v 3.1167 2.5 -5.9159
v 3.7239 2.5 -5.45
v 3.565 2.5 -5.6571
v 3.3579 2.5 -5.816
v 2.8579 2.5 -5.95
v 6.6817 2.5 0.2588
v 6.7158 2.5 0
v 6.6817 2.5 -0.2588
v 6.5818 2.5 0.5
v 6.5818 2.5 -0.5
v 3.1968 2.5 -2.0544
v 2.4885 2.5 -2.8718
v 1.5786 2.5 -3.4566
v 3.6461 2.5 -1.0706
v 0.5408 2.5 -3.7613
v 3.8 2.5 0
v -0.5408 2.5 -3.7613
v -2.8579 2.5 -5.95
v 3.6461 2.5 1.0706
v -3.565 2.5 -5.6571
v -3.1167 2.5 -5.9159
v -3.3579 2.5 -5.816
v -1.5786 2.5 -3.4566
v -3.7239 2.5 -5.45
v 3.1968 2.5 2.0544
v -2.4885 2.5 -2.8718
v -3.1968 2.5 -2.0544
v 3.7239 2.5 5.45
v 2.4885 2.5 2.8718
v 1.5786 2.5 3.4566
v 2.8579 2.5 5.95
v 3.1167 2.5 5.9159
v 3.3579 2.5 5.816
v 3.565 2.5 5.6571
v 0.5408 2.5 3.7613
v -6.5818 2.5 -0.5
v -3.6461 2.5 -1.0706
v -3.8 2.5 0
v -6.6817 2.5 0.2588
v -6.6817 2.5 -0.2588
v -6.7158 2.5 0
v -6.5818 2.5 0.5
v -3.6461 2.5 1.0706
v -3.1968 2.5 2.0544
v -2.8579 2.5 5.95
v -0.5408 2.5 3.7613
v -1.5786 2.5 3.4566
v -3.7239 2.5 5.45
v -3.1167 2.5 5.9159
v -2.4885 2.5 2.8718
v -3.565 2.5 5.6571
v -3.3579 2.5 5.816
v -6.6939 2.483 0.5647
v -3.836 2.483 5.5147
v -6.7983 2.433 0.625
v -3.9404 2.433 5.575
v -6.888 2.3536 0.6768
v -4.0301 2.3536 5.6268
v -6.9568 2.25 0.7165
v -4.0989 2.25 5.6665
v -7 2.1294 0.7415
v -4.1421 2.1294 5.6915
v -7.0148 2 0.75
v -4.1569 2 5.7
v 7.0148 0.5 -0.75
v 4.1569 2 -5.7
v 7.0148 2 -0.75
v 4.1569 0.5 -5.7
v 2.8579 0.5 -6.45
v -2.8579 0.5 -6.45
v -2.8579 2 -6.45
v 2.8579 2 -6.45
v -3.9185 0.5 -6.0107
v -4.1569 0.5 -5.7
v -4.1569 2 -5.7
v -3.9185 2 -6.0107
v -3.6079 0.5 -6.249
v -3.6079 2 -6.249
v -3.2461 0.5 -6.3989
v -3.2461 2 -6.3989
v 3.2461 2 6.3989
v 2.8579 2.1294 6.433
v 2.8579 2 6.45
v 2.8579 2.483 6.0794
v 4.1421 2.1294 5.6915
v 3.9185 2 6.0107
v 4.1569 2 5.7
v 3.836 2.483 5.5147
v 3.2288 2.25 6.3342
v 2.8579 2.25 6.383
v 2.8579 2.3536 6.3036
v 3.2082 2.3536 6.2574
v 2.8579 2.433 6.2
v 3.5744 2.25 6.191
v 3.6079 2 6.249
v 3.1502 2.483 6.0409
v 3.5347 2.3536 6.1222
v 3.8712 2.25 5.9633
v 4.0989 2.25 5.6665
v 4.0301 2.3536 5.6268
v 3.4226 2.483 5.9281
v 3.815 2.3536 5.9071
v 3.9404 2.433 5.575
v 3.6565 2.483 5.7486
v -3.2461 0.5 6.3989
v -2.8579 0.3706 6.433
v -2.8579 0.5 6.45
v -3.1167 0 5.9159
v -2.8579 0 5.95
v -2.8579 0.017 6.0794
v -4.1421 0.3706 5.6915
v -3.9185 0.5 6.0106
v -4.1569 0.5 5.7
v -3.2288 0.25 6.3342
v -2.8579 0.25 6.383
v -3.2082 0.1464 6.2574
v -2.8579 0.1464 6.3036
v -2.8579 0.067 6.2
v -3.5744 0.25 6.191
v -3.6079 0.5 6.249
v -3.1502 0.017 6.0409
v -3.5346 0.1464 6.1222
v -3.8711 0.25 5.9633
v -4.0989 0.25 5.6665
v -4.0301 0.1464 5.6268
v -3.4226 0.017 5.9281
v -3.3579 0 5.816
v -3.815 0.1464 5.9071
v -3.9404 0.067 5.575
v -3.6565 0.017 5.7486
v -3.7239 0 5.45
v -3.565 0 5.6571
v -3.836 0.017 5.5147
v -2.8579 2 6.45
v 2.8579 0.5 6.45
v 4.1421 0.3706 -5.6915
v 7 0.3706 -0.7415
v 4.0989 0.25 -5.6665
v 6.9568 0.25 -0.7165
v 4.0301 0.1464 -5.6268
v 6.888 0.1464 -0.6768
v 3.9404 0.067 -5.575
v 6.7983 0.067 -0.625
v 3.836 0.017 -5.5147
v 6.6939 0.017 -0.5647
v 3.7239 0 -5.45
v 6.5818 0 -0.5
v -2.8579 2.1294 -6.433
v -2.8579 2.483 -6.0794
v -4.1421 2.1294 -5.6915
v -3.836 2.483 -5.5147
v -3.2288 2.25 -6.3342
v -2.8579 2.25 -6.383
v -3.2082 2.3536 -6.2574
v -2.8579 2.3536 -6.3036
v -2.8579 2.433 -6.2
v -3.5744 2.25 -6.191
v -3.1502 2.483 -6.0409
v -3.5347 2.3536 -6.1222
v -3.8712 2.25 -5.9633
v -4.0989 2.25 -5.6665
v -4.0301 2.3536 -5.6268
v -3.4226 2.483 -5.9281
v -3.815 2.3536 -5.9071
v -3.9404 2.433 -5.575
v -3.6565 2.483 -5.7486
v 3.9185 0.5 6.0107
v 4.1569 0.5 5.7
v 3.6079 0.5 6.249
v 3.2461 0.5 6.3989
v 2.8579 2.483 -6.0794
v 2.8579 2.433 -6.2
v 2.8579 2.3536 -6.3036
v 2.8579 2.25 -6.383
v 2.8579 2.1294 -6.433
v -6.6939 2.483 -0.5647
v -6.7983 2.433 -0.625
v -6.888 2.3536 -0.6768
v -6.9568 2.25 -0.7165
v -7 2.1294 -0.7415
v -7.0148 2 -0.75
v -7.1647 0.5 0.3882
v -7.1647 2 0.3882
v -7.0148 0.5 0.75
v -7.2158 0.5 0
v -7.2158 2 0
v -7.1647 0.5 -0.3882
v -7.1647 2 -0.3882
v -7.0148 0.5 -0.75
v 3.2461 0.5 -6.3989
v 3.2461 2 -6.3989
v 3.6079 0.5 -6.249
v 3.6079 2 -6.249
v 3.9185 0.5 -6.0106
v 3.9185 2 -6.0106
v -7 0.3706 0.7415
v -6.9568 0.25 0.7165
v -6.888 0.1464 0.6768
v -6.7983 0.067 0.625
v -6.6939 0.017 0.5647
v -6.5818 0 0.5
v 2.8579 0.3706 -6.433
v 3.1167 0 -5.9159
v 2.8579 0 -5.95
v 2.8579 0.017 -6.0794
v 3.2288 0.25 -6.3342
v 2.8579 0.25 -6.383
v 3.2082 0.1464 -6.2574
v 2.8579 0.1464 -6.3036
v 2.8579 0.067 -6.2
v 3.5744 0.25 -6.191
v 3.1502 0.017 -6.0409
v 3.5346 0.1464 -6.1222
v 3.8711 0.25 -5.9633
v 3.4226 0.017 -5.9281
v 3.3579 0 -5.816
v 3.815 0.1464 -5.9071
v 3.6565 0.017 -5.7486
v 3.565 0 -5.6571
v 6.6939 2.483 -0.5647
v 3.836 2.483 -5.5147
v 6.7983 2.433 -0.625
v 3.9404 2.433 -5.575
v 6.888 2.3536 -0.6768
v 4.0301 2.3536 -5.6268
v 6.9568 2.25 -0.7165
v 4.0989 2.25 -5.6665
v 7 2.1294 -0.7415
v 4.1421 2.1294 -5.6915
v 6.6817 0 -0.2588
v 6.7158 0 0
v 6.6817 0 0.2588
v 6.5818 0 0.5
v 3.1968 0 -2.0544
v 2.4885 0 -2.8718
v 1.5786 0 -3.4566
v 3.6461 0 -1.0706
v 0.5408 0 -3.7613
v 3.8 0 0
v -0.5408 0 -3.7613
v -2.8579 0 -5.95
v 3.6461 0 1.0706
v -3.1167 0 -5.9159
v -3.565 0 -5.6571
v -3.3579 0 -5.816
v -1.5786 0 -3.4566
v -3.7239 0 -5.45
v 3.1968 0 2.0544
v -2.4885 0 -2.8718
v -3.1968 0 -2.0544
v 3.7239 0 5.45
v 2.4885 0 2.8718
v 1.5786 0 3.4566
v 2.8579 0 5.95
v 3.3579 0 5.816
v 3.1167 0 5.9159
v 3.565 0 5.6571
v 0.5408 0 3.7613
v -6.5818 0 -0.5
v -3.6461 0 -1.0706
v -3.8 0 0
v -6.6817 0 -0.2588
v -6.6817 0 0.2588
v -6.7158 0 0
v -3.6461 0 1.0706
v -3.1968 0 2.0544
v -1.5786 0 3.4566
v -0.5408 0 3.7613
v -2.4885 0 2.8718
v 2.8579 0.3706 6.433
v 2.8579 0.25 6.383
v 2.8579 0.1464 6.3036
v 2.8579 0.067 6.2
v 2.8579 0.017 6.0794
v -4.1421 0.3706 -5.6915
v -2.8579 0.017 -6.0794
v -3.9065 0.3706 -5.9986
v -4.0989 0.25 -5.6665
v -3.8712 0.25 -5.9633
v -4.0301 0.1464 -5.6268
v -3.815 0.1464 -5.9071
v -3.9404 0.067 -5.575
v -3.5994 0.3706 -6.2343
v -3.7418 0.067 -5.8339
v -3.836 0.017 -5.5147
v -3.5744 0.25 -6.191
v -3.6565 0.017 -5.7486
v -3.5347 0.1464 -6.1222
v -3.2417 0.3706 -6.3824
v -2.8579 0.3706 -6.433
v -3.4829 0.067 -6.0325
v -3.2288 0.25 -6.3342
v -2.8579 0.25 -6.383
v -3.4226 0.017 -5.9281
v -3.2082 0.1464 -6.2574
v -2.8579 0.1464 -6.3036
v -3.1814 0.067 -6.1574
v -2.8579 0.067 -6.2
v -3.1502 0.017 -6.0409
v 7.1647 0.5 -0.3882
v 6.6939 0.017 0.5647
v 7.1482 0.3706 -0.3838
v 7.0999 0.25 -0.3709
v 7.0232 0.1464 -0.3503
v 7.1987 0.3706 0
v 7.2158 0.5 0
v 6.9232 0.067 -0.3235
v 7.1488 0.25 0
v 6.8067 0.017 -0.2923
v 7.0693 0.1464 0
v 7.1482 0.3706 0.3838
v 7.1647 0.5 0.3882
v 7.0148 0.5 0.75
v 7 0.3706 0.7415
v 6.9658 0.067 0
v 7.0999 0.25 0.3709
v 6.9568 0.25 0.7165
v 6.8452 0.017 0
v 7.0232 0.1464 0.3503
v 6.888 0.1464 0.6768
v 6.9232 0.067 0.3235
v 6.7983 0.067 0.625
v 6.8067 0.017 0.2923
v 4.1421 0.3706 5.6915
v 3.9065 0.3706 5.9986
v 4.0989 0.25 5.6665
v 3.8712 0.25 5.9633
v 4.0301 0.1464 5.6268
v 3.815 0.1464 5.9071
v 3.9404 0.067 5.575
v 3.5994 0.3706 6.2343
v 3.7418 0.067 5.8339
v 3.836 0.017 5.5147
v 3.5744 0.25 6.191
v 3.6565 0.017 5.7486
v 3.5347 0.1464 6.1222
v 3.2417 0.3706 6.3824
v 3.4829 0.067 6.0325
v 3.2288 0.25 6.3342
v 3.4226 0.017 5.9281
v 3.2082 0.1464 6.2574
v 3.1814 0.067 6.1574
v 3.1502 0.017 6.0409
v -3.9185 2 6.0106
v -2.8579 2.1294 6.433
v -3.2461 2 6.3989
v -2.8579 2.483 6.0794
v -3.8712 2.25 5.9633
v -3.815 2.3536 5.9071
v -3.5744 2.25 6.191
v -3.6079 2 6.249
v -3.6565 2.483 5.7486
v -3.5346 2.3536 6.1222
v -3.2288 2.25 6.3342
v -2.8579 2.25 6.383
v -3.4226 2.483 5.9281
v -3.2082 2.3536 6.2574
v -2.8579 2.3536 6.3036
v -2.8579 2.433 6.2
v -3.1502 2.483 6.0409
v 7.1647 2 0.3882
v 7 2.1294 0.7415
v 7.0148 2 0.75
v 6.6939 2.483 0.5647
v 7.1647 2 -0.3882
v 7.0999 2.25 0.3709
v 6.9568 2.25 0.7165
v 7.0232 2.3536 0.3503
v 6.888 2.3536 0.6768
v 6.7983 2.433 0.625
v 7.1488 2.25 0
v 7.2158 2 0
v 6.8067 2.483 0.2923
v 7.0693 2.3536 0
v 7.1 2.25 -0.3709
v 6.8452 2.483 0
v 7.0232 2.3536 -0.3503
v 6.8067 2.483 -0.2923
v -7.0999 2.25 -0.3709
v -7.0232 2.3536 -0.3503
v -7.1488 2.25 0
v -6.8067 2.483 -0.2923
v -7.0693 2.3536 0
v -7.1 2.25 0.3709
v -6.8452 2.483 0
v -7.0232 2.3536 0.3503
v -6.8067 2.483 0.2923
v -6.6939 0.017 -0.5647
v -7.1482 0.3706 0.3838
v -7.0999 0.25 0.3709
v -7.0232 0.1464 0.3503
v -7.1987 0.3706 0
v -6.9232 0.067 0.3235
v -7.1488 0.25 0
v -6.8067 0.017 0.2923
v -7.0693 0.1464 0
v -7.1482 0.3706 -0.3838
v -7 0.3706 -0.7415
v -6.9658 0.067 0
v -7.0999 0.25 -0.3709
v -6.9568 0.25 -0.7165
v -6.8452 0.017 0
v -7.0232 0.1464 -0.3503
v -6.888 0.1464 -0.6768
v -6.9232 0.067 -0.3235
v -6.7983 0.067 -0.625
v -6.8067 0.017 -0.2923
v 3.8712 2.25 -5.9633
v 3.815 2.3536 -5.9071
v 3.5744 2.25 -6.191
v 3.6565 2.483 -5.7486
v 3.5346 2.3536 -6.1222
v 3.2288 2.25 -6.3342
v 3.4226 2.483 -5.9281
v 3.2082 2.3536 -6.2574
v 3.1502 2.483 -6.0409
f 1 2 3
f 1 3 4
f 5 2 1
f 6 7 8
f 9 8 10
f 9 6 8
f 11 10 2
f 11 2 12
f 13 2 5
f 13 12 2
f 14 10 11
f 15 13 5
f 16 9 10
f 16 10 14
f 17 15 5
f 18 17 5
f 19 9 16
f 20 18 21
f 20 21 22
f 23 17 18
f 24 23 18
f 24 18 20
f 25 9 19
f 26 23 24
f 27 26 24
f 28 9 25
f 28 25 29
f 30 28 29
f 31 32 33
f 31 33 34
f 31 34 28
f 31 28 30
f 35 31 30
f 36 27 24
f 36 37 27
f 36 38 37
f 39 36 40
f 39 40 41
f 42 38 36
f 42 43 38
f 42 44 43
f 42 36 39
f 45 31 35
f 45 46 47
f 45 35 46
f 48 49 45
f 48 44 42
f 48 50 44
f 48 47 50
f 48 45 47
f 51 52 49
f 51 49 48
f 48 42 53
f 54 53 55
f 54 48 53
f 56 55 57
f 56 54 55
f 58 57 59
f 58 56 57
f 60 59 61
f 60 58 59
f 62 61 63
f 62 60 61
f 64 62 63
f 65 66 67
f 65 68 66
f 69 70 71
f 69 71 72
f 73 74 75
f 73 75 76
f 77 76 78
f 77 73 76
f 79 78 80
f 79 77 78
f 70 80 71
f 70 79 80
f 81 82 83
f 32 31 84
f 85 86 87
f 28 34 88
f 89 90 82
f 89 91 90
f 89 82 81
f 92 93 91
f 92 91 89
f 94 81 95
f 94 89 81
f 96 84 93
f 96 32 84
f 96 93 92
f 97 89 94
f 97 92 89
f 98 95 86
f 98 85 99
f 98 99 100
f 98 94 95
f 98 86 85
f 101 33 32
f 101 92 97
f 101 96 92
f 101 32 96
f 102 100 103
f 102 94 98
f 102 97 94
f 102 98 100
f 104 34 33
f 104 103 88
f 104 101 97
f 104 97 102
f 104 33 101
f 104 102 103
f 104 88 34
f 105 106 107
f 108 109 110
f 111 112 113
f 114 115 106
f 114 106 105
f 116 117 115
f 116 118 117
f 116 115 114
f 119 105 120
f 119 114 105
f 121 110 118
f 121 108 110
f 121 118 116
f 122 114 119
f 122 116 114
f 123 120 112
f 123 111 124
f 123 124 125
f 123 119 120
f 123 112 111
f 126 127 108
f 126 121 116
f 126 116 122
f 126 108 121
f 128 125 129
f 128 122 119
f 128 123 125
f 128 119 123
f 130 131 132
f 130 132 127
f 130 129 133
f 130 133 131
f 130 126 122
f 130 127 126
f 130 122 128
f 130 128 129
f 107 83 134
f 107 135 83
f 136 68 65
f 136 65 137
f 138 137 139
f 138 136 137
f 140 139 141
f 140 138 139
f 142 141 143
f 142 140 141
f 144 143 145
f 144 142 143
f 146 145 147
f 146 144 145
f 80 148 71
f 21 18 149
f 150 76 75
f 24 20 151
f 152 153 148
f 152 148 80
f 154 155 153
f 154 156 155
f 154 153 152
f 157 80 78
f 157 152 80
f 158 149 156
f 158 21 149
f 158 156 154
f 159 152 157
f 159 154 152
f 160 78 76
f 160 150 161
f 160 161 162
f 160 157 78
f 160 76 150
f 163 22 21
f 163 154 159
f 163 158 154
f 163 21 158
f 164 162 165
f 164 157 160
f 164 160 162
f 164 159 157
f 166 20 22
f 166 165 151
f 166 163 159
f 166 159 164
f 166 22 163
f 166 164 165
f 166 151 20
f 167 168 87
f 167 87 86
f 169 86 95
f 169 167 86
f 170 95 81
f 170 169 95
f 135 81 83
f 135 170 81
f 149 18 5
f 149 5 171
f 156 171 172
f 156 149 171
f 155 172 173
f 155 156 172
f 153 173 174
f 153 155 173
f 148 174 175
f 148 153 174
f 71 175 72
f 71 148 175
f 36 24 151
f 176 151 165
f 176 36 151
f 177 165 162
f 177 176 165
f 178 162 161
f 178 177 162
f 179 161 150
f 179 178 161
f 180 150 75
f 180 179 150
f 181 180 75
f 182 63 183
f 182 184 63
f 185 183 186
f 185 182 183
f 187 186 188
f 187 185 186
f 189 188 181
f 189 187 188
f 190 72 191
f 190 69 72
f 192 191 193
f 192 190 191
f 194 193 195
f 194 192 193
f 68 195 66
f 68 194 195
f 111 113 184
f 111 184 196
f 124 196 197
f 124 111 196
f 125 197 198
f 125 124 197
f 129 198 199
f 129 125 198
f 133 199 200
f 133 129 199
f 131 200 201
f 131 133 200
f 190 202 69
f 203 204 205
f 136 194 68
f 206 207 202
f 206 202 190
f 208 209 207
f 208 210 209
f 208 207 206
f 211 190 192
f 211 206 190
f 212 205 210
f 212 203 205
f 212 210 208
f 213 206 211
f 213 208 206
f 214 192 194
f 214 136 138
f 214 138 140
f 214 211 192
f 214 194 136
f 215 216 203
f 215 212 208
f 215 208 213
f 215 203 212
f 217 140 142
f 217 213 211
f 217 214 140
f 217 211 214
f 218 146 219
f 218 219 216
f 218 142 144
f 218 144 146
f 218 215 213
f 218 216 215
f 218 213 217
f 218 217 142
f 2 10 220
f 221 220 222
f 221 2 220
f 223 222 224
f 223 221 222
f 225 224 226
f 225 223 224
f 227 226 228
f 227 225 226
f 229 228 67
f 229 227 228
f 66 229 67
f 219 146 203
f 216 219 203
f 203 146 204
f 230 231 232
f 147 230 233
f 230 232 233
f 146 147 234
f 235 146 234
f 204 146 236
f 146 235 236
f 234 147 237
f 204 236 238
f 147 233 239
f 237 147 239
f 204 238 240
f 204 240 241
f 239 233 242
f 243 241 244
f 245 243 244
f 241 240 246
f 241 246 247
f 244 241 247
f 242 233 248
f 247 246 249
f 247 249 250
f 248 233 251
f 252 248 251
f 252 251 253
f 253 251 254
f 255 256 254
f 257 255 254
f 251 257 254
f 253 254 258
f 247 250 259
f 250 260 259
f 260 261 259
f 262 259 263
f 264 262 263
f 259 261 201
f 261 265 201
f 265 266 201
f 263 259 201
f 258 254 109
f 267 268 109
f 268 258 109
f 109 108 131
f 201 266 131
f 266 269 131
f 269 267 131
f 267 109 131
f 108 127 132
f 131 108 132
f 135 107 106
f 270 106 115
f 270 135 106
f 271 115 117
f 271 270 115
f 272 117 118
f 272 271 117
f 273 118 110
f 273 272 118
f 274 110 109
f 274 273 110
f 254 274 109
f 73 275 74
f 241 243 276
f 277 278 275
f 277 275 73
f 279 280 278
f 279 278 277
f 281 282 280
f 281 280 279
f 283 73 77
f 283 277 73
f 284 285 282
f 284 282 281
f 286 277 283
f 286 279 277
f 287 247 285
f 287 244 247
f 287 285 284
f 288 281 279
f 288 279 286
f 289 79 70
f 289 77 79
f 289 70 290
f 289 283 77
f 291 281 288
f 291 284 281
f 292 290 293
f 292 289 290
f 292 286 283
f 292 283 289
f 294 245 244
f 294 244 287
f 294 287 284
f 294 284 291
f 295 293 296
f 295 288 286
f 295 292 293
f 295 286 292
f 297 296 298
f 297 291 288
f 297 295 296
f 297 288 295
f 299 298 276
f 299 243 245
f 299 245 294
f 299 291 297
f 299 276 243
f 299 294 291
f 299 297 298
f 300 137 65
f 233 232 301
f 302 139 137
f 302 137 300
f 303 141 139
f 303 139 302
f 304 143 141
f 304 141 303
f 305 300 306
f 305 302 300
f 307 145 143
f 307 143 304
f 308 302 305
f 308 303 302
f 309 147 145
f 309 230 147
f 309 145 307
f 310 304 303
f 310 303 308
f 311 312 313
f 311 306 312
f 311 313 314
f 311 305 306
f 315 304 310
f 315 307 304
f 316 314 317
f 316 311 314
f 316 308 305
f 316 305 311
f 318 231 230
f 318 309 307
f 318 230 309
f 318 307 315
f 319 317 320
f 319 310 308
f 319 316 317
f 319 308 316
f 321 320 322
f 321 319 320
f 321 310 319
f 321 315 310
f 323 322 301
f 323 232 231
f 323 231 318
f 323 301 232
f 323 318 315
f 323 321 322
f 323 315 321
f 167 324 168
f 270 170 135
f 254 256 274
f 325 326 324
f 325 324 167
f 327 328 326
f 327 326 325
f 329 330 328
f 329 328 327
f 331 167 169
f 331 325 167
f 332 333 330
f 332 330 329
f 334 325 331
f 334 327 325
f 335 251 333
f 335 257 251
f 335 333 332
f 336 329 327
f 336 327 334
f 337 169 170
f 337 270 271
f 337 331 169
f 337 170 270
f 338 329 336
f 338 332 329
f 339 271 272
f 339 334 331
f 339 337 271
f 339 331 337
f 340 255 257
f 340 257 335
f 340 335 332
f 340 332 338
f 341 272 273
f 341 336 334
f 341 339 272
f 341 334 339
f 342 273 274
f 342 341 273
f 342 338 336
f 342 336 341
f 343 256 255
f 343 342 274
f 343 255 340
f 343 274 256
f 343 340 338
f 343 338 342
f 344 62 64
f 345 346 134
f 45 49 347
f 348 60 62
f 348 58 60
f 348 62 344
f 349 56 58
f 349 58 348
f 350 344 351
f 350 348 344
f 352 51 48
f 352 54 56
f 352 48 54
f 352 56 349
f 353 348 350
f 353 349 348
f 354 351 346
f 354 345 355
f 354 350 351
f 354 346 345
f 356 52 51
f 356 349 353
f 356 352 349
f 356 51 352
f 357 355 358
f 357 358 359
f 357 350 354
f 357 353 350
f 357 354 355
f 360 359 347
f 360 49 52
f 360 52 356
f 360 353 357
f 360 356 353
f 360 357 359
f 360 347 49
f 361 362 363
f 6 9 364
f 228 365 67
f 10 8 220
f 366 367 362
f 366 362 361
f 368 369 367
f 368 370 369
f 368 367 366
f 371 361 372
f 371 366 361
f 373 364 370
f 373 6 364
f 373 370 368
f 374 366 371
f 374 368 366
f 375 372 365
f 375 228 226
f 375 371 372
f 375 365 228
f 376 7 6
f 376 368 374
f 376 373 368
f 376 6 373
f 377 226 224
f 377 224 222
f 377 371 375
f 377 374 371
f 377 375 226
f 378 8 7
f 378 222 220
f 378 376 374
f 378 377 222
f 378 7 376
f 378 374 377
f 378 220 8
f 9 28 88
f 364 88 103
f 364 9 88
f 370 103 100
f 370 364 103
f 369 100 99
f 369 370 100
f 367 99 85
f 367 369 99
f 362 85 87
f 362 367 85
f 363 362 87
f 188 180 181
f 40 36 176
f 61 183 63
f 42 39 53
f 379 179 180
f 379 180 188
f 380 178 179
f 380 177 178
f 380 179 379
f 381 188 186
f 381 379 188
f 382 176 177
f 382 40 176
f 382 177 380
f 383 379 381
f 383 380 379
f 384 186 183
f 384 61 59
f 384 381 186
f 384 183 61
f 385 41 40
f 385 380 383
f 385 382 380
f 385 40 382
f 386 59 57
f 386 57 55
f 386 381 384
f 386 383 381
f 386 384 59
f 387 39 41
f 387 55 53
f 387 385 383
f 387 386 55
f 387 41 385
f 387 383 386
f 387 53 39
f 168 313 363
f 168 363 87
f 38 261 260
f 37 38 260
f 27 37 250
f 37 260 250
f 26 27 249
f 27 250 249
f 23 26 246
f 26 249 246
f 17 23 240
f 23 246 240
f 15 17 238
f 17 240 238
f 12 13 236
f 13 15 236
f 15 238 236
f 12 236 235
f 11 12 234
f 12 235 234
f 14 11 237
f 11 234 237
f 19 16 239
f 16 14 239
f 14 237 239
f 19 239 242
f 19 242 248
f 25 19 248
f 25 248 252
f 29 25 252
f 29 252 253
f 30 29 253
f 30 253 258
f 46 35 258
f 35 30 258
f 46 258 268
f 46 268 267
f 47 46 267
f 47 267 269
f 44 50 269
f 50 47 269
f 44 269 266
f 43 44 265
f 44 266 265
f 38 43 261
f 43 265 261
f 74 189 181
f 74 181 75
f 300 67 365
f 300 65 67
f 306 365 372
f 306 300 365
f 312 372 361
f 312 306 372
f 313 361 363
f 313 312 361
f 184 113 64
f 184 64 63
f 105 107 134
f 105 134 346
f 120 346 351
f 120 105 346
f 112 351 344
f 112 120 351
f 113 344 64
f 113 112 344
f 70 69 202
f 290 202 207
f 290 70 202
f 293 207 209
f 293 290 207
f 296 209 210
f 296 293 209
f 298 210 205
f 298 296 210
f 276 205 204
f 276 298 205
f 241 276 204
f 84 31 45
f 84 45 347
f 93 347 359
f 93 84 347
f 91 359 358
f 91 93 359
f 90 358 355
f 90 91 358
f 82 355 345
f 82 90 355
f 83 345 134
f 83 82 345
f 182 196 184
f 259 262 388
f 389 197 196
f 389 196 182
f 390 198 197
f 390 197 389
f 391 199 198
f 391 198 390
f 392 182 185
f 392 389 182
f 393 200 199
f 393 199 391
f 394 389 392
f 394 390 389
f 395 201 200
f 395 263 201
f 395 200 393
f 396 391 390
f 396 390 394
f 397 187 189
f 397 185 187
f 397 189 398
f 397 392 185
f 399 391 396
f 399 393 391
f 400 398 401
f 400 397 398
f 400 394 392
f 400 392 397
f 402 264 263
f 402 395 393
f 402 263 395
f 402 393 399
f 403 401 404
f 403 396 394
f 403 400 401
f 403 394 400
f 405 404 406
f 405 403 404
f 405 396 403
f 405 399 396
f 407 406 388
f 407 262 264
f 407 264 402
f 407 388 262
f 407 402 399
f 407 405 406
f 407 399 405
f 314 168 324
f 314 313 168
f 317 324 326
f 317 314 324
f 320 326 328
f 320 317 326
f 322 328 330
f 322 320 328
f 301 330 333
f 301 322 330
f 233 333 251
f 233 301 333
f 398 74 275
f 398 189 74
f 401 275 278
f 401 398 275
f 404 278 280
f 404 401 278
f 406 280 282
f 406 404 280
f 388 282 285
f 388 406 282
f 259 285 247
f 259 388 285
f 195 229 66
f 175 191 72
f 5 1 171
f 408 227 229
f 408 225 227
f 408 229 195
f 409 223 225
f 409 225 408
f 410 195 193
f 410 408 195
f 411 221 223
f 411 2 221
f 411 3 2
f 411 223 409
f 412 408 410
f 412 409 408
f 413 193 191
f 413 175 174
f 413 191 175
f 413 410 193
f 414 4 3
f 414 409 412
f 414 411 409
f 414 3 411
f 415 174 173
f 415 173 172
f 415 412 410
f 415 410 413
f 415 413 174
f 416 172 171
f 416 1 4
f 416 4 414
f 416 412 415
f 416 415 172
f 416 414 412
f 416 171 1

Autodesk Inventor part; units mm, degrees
ref_plane "YZ Plane" through (0, 0, 0) normal (1, 0, 0) x (0, 1, 0)
ref_plane "XZ Plane" through (0, 0, 0) normal (0, 1, 0) x (-1, 0, 0)
ref_plane "XY Plane" through (0, 0, 0) normal (0, 0, 1) x (1, 0, 0)
sketch "Sketch1" plane through (0, 0, 0) normal (0, 1, 0) x (-1, 0, 0)
  line L0 (7.0148, -0.75) -> (4.1569, -5.7)
  line L1 (2.8579, -6.45) -> (-2.8579, -6.45)
  line L2 (-4.1569, -5.7) -> (-7.0148, -0.75)
  line L3 (-7.0148, 0.75) -> (-4.1569, 5.7)
  line L4 (-2.8579, 6.45) -> (2.8579, 6.45)
  line L5 (4.1569, 5.7) -> (7.0148, 0.75)
  arc A0 (7.0148, -0.75) -> (7.0148, 0.75) centre (5.7158, 0) ccw
  arc A1 (4.1569, 5.7) -> (2.8579, 6.45) centre (2.8579, 4.95) ccw
  arc A2 (-2.8579, 6.45) -> (-4.1569, 5.7) centre (-2.8579, 4.95) ccw
  arc A3 (-7.0148, 0.75) -> (-7.0148, -0.75) centre (-5.7158, 0) ccw
  arc A4 (-4.1569, -5.7) -> (-2.8579, -6.45) centre (-2.8579, -4.95) ccw
  arc A5 (2.8579, -6.45) -> (4.1569, -5.7) centre (2.8579, -4.95) ccw
  circle A6 centre (0, 0) radius 3.8
  point P0 (7.4478, 0)
  point P1 (3.7239, -6.45)
  point P2 (-3.7239, -6.45)
  point P3 (-7.4478, 0)
  point P4 (-3.7239, 6.45)
  point P5 (3.7239, 6.45)
  dimension "d0" = 12.9
  dimension "d1" = 1.5
  dimension "d2" = 1.5
  dimension "d3" = 7.6
extrude "Extrusion1" add sketch "Sketch1" along normal blind 2.5
fillet "Fillet1" radius 0.5 24 edges at (3.6079, 2.5, 6.249) (5.5859, 2.5, 3.225) (7.2158, 2.5, 0) (5.5859, 2.5, -3.225) (3.6079, 2.5, -6.249) (0, 2.5, -6.45) (-3.6079, 2.5, -6.249) (-5.5859, 2.5, -3.225) (-7.2158, 2.5, 0) (-5.5859, 2.5, 3.225) (-3.6079, 2.5, 6.249) (0, 2.5, 6.45) (3.6079, 0, 6.249) (5.5859, 0, 3.225) (7.2158, 0, 0) (5.5859, 0, -3.225) (3.6079, 0, -6.249) (0, 0, -6.45) (-3.6079, 0, -6.249) (-5.5859, 0, -3.225) (-7.2158, 0, 0) (-5.5859, 0, 3.225) (-3.6079, 0, 6.249) (0, 0, 6.45)
thread "Thread1" size "M8x0.75" class "6H" standard "ANSI Metric M Profile" length 12.5
properties part number "LED Nut"
